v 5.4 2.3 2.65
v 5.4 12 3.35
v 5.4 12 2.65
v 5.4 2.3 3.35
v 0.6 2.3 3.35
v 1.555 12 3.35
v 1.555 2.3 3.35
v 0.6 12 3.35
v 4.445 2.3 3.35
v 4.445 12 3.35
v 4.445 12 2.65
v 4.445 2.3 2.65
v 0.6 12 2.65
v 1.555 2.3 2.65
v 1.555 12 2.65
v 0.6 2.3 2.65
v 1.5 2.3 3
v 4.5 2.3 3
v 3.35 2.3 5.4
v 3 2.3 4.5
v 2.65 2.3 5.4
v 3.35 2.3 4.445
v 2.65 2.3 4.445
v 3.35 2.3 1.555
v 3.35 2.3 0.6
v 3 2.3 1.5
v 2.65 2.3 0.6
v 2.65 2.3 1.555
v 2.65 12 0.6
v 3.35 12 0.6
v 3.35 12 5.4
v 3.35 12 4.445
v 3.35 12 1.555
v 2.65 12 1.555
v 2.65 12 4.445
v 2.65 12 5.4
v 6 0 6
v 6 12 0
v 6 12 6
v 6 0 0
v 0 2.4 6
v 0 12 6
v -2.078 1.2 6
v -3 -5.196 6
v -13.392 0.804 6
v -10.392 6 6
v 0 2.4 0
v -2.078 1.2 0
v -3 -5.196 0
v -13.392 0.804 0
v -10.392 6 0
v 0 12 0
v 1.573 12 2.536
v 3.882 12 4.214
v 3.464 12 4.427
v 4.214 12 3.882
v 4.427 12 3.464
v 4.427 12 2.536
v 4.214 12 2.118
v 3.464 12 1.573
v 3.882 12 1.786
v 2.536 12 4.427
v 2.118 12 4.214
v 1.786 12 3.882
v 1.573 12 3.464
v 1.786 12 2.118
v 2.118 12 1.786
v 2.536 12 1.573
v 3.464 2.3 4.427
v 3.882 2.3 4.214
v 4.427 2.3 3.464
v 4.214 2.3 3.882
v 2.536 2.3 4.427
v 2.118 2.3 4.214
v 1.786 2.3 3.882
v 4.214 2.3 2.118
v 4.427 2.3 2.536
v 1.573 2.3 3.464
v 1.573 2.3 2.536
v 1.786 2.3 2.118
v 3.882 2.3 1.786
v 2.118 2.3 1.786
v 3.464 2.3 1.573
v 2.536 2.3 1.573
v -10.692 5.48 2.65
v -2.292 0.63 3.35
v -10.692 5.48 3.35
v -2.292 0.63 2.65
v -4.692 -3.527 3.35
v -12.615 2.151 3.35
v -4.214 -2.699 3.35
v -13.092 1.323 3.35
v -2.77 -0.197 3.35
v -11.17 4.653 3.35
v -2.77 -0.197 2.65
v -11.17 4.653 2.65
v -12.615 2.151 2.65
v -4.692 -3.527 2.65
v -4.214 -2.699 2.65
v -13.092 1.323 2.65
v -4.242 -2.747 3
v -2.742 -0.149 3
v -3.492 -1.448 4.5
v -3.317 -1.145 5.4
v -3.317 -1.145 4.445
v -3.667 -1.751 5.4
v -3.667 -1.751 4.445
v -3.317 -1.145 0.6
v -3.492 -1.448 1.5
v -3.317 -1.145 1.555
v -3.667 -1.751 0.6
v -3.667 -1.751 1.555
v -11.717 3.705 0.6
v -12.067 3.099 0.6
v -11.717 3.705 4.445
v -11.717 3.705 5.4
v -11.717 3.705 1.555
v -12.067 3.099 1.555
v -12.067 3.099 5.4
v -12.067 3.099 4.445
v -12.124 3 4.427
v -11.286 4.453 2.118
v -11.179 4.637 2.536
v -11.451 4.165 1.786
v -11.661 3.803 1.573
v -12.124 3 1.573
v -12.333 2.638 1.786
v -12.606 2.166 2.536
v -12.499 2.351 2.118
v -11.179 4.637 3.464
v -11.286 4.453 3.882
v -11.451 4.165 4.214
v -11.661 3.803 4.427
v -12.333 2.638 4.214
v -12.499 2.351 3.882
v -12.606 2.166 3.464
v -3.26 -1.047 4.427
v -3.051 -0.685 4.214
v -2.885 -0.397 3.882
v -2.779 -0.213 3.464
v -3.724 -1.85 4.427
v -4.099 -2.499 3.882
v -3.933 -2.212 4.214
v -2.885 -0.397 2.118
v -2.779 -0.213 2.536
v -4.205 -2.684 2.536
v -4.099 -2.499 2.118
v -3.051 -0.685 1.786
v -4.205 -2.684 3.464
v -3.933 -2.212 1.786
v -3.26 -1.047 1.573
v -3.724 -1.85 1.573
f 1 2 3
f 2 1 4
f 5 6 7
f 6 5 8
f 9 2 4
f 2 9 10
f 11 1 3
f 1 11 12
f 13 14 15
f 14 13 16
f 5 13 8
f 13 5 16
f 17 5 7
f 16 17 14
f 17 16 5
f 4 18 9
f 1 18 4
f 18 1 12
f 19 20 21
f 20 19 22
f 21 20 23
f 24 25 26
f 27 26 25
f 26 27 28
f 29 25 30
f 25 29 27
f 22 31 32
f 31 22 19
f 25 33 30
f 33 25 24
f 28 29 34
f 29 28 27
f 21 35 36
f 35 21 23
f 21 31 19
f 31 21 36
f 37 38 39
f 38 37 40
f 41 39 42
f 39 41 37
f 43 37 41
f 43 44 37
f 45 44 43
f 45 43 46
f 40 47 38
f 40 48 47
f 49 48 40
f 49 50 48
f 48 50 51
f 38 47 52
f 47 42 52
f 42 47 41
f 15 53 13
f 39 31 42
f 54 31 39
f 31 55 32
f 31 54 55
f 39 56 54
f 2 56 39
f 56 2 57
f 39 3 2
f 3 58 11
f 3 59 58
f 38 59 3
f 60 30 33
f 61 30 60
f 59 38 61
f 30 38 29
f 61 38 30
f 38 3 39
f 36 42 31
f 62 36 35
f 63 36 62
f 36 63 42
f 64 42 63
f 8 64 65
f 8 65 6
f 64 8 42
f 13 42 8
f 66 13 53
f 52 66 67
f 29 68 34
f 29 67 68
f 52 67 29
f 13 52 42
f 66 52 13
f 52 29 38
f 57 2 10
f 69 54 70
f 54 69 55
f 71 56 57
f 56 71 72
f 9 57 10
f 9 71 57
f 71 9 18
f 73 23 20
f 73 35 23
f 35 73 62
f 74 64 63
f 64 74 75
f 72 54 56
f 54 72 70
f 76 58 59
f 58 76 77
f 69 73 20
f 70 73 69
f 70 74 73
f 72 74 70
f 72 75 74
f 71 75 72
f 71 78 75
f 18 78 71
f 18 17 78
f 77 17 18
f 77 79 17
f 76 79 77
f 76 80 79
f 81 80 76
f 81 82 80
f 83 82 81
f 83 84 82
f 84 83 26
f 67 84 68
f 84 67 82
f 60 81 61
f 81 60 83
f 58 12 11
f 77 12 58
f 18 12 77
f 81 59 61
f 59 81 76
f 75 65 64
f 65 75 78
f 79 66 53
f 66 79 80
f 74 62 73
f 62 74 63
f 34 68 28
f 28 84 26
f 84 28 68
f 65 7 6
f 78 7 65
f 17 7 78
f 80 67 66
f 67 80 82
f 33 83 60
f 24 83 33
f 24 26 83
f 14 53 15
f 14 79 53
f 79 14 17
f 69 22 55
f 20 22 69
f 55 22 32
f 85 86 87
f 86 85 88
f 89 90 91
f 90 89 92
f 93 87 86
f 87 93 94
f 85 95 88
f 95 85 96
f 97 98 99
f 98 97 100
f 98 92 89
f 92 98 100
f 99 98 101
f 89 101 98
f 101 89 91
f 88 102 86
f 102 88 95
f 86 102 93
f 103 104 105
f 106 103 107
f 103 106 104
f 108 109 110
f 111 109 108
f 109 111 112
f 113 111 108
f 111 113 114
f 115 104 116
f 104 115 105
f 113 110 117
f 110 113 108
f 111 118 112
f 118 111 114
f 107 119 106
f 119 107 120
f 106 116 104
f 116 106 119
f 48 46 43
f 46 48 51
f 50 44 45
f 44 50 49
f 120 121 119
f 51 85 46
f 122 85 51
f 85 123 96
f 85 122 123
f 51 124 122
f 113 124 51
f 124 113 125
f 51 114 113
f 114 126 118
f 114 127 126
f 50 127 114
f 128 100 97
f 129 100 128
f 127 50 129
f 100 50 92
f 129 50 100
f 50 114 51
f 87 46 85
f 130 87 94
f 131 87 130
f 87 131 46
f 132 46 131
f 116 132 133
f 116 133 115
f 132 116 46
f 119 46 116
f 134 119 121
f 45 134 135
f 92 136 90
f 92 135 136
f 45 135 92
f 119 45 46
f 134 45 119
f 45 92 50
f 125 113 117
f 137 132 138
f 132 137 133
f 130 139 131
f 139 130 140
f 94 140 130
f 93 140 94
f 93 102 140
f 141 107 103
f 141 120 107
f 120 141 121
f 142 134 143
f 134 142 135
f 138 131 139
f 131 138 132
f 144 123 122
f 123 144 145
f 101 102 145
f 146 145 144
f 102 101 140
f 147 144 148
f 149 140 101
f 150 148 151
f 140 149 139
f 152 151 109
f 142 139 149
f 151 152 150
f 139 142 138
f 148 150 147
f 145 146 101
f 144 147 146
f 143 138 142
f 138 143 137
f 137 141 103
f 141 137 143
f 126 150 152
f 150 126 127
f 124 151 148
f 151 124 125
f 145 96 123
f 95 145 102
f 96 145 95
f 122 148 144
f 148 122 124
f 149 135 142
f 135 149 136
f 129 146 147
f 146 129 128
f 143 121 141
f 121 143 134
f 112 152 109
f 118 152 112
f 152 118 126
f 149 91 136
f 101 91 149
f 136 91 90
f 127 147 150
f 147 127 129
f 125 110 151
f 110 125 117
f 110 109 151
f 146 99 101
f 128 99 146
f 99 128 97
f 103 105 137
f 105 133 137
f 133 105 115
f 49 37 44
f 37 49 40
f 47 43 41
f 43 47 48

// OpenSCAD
// preview[view: north west, tilt: top diagonal]
//Enter the angle between the skewers
degrees=60; // [15:180]
//Measure the diameter of your skewers in mm
skewer_diameter=3; // [2:0.1:5]

/* [Hidden] */

    scale_model=skewer_diameter/3;
    wh=6*scale_model;
    l=12*scale_model; 
    deg=degrees;
    holeD=wh*0.5;
    holeL=l-2;
    plusW=wh*0.8;
    plusH=0.7;
    
render(convexity = 1){
union(){
   difference(){
            cube([wh,l,wh]);
            translate([wh/2,l+0.3,wh/2]) rotate([90,0,0]) cylinder($fn=20,holeL,d=holeD);
            translate([wh/2,l-0.5*holeL+0.3,wh/2]){
                cube([plusW,holeL,plusH],true);
                rotate([0,90,0]) cube([plusW,holeL,plusH],true);
            }
        }
    
    rotate([0,0,deg]) translate([-wh,0,0]){
        difference(){
            cube([wh,l,wh]);
            translate([wh/2,l+0.3,wh/2]) rotate([90,0,0]) cylinder($fn=20,holeL,d=holeD); 
            translate([wh/2,l-0.5*holeL+0.3,wh/2]){
                cube([plusW,holeL,plusH],true);
                rotate([0,90,0]) cube([plusW,holeL,plusH],true);
            } 
        }
    }    
}
}
linear_extrude(height = wh) polygon(
    points=[
        [wh,0],
        [0,0.2*l],
        [-0.2*l*cos(deg-90),-0.2*l*sin(deg-90)],
        [wh*cos(180-deg),-wh*sin(180-deg)]]);
